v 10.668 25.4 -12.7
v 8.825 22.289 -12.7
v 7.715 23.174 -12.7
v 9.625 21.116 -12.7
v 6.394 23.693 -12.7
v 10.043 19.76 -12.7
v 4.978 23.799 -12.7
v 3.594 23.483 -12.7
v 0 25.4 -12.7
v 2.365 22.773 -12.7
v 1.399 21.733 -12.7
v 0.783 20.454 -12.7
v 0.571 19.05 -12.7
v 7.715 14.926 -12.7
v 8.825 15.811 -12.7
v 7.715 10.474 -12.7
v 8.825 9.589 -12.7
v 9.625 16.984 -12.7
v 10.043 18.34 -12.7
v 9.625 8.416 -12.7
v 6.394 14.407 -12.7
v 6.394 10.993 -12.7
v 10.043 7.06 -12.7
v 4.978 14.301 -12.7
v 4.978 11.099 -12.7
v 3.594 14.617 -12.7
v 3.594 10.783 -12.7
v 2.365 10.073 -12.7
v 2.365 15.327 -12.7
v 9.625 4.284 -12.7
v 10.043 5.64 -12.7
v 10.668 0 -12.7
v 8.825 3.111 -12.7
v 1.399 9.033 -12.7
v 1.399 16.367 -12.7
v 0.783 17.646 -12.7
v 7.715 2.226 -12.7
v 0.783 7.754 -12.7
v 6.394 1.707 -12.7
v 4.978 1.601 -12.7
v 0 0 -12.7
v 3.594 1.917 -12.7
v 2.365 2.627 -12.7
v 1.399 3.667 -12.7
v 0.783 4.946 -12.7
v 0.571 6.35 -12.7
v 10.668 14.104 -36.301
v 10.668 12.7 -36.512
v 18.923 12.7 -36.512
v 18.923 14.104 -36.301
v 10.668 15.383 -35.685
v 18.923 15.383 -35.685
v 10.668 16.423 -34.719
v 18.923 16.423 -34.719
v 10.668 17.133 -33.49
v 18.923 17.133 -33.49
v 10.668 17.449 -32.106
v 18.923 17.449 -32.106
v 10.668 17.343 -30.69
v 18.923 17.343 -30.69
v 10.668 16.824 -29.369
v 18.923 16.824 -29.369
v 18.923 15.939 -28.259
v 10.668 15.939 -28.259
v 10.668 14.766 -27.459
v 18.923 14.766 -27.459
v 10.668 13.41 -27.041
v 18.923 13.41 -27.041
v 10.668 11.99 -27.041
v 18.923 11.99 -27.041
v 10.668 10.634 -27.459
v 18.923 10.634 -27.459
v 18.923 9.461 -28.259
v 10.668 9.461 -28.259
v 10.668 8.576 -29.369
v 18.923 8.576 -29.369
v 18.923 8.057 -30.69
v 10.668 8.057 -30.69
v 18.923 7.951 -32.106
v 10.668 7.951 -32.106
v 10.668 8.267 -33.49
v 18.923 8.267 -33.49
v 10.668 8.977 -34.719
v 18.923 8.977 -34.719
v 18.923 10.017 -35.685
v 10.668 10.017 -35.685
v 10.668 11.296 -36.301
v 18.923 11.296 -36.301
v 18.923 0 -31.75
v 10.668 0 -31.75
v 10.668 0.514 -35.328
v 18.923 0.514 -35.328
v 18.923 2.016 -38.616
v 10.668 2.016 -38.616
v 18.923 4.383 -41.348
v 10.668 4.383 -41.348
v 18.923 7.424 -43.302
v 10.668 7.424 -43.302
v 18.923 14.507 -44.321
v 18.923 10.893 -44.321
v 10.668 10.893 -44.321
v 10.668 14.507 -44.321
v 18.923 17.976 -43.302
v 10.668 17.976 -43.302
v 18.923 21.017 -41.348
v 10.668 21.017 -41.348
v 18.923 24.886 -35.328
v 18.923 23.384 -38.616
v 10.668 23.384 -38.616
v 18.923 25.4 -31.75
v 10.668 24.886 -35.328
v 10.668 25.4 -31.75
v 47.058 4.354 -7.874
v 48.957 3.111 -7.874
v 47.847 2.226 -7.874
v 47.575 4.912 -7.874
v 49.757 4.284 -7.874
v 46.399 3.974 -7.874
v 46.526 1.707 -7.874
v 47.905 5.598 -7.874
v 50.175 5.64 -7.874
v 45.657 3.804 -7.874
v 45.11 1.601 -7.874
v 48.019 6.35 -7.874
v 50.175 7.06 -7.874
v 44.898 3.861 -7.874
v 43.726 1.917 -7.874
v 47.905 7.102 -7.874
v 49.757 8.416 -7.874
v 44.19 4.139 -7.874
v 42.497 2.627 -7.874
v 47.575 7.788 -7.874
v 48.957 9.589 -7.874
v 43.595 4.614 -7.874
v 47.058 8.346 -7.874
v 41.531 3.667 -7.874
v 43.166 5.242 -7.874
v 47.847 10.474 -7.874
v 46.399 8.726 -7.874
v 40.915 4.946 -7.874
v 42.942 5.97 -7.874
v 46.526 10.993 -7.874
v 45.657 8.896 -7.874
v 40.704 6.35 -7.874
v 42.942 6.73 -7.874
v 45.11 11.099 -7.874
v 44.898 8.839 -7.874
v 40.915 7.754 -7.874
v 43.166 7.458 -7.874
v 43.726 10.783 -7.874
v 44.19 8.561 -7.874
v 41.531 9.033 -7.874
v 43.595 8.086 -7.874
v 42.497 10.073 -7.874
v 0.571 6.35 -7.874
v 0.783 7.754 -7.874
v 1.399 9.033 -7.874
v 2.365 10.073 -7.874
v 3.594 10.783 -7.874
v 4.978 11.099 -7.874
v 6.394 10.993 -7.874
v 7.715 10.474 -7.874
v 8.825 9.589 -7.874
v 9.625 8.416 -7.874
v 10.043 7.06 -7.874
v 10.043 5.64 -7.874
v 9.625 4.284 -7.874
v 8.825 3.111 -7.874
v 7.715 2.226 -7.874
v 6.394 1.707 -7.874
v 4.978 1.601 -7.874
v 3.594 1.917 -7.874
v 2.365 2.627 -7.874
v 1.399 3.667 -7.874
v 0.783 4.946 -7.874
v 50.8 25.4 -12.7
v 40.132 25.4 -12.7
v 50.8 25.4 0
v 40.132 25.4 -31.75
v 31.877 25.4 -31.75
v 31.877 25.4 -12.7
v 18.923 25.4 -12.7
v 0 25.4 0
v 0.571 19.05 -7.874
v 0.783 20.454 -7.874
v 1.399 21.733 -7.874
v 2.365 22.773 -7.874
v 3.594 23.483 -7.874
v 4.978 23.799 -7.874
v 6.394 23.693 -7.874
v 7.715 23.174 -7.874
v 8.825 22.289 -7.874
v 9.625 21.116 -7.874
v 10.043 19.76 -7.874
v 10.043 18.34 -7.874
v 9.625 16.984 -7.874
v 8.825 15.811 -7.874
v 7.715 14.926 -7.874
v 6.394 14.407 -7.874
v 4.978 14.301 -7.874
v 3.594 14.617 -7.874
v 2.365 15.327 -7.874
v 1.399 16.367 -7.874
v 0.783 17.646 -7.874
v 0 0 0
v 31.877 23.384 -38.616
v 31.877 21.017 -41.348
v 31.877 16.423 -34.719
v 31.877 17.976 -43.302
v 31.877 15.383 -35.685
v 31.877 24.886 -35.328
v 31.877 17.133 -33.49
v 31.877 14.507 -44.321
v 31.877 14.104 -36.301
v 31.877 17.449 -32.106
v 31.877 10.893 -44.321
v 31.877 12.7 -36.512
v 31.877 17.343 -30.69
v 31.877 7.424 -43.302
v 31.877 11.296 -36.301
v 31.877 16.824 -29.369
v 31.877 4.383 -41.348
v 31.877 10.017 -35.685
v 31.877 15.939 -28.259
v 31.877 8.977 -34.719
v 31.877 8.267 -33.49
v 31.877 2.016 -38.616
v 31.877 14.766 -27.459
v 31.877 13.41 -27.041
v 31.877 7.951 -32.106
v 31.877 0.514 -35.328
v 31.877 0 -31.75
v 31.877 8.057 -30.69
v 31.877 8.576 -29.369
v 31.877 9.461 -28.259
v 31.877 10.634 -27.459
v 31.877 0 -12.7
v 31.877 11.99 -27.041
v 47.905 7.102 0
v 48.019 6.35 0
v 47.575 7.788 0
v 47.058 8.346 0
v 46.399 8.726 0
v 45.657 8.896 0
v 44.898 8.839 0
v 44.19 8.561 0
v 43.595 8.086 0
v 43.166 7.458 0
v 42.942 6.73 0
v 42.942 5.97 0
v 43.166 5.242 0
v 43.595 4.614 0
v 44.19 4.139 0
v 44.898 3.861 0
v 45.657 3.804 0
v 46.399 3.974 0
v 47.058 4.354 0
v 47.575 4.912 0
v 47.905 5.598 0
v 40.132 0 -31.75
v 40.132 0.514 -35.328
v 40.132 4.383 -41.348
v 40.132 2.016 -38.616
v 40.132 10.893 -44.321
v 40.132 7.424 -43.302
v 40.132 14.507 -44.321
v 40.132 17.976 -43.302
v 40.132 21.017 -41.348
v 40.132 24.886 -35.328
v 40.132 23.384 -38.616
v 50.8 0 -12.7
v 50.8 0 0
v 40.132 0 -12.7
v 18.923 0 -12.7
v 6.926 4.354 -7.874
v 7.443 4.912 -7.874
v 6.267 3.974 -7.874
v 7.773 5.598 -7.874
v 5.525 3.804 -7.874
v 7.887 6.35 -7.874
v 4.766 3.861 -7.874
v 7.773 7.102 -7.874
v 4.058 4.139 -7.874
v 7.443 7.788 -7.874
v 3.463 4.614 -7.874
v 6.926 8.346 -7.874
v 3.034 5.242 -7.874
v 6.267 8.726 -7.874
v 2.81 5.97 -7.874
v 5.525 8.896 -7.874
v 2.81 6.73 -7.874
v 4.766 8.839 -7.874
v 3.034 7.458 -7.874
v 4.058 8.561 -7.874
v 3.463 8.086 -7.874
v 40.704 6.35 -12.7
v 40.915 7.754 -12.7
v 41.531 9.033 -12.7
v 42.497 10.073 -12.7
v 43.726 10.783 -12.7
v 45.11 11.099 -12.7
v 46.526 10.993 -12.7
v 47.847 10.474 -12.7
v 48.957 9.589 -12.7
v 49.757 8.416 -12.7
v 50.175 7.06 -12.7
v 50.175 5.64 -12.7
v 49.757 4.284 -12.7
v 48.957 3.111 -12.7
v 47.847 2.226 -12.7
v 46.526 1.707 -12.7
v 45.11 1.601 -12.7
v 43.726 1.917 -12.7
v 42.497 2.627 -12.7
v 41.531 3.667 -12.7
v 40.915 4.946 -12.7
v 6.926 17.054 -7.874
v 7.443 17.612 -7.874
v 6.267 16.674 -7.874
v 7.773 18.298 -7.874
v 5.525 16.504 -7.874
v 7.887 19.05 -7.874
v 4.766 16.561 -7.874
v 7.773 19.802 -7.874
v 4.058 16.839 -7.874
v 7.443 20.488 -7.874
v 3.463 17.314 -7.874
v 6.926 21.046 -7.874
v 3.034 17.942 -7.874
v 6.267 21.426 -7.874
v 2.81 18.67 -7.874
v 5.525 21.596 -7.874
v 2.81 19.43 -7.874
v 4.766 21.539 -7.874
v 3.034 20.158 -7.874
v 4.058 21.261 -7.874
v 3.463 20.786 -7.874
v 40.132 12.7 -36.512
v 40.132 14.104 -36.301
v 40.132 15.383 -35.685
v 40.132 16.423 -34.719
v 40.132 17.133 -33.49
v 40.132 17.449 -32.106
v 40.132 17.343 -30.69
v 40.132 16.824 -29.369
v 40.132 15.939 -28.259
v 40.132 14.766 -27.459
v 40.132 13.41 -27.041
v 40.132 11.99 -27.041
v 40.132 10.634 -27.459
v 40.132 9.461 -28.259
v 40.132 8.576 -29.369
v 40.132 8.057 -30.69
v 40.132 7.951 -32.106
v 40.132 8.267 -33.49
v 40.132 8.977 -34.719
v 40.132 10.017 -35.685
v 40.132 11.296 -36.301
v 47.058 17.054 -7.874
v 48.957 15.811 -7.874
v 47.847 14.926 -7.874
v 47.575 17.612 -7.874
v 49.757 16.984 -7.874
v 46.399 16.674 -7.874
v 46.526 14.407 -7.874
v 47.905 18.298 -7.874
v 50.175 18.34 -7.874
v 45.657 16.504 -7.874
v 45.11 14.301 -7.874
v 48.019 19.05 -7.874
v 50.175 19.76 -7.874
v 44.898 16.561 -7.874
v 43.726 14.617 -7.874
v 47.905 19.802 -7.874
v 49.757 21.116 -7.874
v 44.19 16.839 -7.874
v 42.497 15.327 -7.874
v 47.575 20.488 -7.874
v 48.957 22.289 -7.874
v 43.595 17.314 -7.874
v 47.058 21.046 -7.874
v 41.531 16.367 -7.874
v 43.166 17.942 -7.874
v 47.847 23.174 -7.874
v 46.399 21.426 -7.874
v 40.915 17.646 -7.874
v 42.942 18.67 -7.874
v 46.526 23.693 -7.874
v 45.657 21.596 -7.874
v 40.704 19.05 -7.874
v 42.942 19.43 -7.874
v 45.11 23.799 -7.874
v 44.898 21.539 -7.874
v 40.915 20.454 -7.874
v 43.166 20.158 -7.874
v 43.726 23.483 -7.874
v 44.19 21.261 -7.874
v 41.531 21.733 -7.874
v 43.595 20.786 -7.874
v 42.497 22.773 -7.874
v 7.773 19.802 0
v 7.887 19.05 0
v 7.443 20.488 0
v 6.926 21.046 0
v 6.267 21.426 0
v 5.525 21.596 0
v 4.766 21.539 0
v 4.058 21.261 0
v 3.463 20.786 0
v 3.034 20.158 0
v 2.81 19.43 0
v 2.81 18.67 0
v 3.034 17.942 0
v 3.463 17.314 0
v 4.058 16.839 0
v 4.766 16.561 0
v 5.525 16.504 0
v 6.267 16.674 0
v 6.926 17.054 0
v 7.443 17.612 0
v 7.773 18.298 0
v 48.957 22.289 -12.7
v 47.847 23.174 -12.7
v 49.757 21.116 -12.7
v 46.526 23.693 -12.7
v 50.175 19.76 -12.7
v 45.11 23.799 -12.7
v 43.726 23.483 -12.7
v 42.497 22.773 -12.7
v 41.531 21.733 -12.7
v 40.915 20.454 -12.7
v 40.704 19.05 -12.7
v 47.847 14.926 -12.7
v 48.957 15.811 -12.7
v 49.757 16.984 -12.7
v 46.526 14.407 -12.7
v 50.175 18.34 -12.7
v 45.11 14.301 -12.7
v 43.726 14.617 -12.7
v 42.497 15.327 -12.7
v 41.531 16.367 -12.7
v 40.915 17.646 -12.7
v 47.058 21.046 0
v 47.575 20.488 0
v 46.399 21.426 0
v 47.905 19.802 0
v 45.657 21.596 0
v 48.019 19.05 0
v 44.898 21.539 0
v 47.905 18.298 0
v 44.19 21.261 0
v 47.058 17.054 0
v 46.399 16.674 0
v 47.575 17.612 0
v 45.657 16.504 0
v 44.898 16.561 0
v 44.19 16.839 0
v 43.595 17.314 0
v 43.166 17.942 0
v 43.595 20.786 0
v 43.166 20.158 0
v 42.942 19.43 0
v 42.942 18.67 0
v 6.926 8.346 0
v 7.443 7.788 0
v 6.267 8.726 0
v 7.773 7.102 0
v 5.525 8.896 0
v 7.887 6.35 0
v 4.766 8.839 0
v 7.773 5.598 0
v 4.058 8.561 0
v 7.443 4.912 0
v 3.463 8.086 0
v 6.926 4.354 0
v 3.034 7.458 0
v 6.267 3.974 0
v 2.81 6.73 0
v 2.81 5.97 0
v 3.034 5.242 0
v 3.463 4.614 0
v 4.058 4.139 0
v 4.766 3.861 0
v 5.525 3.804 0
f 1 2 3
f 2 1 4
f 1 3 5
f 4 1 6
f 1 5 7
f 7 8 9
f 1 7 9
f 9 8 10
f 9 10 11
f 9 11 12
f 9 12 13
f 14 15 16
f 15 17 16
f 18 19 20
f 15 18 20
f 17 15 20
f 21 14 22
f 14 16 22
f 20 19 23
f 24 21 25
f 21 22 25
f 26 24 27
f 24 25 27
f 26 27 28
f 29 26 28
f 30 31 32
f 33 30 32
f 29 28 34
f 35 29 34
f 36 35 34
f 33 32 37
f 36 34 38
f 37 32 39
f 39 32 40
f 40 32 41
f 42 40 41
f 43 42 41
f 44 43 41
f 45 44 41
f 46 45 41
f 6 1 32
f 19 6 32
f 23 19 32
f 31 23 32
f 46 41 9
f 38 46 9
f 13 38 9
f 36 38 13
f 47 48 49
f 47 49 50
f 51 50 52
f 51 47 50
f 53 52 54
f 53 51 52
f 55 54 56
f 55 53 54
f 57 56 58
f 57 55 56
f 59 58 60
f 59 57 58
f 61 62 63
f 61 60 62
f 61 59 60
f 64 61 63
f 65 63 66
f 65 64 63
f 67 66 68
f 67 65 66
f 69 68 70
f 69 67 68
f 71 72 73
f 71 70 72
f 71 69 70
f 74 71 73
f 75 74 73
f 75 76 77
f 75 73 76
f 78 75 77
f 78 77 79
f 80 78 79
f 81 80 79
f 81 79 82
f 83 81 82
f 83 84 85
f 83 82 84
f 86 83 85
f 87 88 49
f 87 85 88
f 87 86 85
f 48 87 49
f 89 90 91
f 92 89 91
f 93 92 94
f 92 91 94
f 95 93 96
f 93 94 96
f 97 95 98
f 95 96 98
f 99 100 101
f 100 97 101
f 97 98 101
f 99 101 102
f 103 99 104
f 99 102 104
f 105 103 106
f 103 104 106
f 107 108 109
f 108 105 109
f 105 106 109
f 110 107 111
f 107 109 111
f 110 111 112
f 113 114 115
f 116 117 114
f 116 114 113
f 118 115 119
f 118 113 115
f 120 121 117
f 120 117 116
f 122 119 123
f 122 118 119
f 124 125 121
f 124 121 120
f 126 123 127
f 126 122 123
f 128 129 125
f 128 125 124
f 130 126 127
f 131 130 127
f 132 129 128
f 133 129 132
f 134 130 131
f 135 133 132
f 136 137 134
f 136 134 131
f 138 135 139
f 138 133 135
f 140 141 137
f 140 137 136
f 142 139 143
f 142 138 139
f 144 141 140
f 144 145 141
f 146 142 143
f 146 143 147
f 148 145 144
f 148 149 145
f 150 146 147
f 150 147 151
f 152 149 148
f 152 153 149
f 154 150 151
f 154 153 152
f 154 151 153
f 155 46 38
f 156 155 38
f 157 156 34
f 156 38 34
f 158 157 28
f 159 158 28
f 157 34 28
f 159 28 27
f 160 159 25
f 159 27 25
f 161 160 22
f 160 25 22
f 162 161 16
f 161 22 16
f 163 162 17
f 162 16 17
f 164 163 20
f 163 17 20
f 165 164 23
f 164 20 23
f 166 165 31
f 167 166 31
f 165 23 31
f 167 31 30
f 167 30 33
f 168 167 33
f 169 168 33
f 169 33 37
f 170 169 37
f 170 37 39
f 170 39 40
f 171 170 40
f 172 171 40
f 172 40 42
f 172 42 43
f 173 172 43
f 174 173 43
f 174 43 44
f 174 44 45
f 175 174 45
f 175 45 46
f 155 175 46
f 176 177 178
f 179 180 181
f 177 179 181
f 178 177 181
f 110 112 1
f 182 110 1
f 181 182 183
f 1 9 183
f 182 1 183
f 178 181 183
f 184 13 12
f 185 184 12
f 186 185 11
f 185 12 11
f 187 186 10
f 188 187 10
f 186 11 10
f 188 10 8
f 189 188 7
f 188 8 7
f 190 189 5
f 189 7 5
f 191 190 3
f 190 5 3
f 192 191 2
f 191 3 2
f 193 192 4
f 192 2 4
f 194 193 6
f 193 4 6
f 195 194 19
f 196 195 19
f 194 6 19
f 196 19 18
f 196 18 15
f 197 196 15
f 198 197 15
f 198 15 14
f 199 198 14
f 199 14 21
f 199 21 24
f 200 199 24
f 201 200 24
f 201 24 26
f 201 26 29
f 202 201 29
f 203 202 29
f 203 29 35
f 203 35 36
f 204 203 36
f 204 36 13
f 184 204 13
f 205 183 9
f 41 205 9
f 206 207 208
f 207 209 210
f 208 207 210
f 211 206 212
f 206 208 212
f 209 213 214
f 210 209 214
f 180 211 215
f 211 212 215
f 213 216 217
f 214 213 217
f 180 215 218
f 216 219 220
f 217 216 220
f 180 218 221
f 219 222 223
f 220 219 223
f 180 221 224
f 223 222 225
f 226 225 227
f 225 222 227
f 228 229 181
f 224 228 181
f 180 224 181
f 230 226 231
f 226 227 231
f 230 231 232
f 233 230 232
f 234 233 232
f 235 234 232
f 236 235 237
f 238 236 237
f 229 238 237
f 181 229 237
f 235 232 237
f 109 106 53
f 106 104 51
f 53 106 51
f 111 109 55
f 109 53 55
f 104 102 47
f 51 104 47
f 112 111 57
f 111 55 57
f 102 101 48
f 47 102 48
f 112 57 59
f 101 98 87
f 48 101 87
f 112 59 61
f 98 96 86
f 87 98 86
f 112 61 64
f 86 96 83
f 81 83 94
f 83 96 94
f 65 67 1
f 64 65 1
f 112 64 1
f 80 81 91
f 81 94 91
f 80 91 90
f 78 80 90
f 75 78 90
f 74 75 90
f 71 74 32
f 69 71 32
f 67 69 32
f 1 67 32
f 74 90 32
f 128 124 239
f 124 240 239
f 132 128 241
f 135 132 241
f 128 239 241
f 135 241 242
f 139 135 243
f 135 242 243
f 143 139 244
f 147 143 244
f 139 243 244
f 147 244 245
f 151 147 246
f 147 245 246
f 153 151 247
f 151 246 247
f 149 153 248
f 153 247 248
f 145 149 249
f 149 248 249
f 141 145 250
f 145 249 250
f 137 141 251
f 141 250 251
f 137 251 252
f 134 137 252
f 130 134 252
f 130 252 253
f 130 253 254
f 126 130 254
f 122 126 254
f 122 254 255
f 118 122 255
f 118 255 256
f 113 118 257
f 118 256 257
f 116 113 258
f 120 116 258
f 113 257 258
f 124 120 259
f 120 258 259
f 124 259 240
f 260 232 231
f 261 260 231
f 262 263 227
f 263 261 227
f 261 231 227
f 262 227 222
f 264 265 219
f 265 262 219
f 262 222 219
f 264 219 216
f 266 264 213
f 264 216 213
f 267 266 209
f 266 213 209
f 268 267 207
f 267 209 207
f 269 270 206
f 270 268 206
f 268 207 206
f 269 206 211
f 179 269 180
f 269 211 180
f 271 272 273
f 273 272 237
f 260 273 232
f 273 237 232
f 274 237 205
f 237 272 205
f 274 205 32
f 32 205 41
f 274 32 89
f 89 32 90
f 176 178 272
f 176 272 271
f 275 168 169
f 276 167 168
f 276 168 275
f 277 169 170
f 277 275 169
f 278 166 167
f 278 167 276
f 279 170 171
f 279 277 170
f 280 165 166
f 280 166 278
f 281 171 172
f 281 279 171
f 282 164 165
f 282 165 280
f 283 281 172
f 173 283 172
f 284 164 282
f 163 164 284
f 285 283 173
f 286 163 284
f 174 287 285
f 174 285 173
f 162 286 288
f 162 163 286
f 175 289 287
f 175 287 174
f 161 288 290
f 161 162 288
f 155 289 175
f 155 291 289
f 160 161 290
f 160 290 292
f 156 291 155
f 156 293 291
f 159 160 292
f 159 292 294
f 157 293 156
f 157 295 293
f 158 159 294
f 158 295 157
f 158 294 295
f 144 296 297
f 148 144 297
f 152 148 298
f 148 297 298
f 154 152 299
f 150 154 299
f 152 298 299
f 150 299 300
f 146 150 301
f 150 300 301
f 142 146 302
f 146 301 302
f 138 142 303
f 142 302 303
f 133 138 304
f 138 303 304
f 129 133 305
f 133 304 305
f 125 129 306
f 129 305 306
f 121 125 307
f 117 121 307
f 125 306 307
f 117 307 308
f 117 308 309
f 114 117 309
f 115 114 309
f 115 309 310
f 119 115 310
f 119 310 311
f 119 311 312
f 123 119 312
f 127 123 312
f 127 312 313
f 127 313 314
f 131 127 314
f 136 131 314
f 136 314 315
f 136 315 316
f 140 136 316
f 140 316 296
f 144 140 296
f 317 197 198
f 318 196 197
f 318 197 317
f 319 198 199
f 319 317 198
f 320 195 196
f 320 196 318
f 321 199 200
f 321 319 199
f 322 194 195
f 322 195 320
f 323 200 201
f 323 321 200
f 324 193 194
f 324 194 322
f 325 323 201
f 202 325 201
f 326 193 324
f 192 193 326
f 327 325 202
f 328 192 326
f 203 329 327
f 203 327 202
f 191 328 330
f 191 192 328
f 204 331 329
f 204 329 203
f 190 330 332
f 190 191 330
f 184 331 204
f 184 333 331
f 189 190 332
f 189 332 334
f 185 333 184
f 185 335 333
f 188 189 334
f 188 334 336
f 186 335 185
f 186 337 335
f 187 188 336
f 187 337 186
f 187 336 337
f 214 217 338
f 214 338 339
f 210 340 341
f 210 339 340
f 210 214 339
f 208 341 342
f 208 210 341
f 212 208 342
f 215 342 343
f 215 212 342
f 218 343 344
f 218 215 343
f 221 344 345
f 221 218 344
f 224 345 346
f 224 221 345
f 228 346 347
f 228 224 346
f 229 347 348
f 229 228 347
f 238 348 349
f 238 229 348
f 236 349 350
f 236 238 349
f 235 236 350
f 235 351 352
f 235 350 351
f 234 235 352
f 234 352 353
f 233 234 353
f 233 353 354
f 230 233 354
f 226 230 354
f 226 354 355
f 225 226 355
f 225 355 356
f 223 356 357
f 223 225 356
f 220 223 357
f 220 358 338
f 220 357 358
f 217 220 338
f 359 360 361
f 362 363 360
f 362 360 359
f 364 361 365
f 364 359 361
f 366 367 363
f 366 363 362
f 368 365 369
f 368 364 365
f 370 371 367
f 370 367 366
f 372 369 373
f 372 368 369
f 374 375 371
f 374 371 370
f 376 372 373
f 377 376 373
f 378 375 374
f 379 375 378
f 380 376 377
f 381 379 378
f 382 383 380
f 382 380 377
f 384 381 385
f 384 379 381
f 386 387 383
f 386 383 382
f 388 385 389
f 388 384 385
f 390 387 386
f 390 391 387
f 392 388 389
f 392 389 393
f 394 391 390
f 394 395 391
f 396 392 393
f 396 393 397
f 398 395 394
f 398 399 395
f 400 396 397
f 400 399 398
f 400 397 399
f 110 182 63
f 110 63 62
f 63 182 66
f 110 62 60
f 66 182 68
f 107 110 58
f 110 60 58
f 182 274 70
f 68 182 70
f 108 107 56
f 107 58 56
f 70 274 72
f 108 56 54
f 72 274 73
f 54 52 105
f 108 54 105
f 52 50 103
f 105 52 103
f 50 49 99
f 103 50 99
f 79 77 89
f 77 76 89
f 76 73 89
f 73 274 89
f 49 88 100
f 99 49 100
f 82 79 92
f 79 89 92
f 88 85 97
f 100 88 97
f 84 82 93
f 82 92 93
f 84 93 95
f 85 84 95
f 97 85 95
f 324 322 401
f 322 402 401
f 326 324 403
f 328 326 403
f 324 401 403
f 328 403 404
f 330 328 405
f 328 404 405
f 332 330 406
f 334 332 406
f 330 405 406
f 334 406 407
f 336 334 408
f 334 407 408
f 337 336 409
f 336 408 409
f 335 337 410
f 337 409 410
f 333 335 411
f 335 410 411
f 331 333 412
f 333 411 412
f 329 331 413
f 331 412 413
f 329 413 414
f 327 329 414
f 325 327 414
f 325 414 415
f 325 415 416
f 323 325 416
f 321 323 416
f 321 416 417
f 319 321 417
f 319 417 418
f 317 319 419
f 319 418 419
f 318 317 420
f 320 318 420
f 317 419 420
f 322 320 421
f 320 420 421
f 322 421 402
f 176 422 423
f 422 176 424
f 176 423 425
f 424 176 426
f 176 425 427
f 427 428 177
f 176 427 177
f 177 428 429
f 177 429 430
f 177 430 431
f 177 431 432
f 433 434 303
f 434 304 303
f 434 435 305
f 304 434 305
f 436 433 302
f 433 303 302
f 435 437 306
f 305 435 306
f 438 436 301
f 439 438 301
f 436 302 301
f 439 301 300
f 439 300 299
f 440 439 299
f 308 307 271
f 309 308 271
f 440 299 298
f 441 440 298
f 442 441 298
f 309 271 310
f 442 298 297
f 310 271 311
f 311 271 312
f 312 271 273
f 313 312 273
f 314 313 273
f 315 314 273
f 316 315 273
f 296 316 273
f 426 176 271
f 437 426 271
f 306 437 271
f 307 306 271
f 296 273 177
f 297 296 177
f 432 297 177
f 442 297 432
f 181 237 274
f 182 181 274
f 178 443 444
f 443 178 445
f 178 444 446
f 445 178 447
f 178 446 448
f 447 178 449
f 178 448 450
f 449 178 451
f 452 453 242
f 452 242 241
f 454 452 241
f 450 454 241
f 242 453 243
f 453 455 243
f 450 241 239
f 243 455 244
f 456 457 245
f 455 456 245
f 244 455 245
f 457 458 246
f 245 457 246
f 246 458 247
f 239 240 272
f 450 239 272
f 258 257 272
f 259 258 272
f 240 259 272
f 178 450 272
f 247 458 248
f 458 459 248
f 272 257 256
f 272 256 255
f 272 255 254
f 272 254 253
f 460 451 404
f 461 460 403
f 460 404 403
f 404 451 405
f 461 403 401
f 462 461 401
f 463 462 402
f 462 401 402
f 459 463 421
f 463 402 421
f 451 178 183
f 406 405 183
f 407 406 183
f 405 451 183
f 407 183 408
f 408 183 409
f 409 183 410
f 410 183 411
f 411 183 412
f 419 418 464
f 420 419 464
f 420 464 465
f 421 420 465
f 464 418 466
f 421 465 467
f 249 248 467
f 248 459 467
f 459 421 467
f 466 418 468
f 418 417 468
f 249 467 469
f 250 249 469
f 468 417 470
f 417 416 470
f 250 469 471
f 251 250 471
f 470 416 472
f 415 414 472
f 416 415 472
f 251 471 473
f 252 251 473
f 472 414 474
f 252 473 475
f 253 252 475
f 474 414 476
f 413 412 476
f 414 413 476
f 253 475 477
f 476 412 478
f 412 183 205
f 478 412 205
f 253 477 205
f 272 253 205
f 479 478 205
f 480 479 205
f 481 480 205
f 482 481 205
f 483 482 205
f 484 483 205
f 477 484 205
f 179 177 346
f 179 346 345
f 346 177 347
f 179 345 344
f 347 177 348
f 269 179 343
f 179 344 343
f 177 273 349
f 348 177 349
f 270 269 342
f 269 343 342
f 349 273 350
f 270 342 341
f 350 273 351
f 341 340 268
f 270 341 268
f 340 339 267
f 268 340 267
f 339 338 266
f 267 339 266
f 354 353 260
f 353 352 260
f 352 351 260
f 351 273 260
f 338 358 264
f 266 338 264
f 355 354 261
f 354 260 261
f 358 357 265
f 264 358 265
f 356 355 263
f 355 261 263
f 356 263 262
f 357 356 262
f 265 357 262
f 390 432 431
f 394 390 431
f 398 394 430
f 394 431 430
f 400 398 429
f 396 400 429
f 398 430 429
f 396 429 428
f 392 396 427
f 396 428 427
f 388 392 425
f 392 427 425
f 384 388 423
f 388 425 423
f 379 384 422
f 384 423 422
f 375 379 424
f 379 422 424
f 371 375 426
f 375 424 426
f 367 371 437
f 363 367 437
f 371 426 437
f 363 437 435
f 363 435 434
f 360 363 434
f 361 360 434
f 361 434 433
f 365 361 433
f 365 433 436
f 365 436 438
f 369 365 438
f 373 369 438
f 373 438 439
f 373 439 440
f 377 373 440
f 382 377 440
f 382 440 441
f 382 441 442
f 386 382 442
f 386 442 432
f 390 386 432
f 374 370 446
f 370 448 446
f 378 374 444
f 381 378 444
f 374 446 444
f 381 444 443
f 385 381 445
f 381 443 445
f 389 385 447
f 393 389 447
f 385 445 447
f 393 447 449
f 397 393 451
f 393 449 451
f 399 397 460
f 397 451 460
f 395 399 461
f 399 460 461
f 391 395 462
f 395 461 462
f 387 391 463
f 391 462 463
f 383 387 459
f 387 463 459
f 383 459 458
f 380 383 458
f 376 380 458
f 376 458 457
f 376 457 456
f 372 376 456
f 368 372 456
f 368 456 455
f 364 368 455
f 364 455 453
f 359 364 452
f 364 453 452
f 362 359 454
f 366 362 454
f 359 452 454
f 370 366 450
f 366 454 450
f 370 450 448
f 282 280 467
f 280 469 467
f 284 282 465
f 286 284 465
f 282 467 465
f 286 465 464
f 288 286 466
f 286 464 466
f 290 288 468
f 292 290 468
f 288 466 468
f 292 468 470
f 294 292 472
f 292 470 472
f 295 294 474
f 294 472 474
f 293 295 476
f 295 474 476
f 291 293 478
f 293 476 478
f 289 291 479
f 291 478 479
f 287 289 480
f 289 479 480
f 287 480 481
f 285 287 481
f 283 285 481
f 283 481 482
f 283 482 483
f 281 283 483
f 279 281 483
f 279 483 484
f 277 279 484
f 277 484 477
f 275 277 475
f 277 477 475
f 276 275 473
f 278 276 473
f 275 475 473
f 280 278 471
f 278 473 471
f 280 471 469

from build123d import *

# Parameters (mm, degrees)
SKETCH1_R                                       = 4.7625
BOSS_EXTRUDE1_DEPTH                             = 50.8
CUT_EXTRUDE1_DEPTH                              = 26.4
CBORE_FOR_10_SOCKET_HEAD_CAP_SCREW1_D           = 5.1054
CBORE_FOR_10_SOCKET_HEAD_CAP_SCREW1_CBORE_D     = 9.525
CBORE_FOR_10_SOCKET_HEAD_CAP_SCREW1_CBORE_DEPTH = 4.826


with BuildPart() as part:
    # Sketch1 → Boss-Extrude1 (new body)
    with BuildSketch(Plane(origin=(0, 0, 0), x_dir=(0, 0, -1), z_dir=(1, 0, 0))):
        with BuildLine():
            Line((0, 0), (31.75, 0))
            ThreePointArc((31.75, 0), (44.45, 12.7), (31.75, 25.4))
            Line((31.75, 25.4), (0, 25.4))
            Line((0, 25.4), (0, 0))
        make_face()
        with Locations((31.75, 12.7)):
            Circle(SKETCH1_R, mode=Mode.SUBTRACT)
    extrude(amount=BOSS_EXTRUDE1_DEPTH)

    # Sketch2 → Cut-Extrude1 (cut, through all)
    with BuildSketch(Plane.XZ):
        Polygon((50.8, -12.7), (40.132, -12.7), (40.132, -44.45), (31.877, -44.45), (31.877, -12.7), (18.923, -12.7), (18.923, -44.45), (10.668, -44.45), (10.668, -12.7), (0, -12.7), (0, -50.8), (50.8, -50.8), align=None)
    extrude(amount=-CUT_EXTRUDE1_DEPTH, mode=Mode.SUBTRACT)

    # CBORE for #10 Socket Head Cap Screw1 (through all)
    with Locations(Plane(origin=(0, 0, -12.7), x_dir=(-1, 0, 0), z_dir=(0, 0, -1))):
        with Locations((-45.466, 6.35), (-45.466, 19.05), (-5.334, 19.05), (-5.334, 6.35)):
            CounterBoreHole(CBORE_FOR_10_SOCKET_HEAD_CAP_SCREW1_D / 2, CBORE_FOR_10_SOCKET_HEAD_CAP_SCREW1_CBORE_D / 2, CBORE_FOR_10_SOCKET_HEAD_CAP_SCREW1_CBORE_DEPTH)


solid = part.part
